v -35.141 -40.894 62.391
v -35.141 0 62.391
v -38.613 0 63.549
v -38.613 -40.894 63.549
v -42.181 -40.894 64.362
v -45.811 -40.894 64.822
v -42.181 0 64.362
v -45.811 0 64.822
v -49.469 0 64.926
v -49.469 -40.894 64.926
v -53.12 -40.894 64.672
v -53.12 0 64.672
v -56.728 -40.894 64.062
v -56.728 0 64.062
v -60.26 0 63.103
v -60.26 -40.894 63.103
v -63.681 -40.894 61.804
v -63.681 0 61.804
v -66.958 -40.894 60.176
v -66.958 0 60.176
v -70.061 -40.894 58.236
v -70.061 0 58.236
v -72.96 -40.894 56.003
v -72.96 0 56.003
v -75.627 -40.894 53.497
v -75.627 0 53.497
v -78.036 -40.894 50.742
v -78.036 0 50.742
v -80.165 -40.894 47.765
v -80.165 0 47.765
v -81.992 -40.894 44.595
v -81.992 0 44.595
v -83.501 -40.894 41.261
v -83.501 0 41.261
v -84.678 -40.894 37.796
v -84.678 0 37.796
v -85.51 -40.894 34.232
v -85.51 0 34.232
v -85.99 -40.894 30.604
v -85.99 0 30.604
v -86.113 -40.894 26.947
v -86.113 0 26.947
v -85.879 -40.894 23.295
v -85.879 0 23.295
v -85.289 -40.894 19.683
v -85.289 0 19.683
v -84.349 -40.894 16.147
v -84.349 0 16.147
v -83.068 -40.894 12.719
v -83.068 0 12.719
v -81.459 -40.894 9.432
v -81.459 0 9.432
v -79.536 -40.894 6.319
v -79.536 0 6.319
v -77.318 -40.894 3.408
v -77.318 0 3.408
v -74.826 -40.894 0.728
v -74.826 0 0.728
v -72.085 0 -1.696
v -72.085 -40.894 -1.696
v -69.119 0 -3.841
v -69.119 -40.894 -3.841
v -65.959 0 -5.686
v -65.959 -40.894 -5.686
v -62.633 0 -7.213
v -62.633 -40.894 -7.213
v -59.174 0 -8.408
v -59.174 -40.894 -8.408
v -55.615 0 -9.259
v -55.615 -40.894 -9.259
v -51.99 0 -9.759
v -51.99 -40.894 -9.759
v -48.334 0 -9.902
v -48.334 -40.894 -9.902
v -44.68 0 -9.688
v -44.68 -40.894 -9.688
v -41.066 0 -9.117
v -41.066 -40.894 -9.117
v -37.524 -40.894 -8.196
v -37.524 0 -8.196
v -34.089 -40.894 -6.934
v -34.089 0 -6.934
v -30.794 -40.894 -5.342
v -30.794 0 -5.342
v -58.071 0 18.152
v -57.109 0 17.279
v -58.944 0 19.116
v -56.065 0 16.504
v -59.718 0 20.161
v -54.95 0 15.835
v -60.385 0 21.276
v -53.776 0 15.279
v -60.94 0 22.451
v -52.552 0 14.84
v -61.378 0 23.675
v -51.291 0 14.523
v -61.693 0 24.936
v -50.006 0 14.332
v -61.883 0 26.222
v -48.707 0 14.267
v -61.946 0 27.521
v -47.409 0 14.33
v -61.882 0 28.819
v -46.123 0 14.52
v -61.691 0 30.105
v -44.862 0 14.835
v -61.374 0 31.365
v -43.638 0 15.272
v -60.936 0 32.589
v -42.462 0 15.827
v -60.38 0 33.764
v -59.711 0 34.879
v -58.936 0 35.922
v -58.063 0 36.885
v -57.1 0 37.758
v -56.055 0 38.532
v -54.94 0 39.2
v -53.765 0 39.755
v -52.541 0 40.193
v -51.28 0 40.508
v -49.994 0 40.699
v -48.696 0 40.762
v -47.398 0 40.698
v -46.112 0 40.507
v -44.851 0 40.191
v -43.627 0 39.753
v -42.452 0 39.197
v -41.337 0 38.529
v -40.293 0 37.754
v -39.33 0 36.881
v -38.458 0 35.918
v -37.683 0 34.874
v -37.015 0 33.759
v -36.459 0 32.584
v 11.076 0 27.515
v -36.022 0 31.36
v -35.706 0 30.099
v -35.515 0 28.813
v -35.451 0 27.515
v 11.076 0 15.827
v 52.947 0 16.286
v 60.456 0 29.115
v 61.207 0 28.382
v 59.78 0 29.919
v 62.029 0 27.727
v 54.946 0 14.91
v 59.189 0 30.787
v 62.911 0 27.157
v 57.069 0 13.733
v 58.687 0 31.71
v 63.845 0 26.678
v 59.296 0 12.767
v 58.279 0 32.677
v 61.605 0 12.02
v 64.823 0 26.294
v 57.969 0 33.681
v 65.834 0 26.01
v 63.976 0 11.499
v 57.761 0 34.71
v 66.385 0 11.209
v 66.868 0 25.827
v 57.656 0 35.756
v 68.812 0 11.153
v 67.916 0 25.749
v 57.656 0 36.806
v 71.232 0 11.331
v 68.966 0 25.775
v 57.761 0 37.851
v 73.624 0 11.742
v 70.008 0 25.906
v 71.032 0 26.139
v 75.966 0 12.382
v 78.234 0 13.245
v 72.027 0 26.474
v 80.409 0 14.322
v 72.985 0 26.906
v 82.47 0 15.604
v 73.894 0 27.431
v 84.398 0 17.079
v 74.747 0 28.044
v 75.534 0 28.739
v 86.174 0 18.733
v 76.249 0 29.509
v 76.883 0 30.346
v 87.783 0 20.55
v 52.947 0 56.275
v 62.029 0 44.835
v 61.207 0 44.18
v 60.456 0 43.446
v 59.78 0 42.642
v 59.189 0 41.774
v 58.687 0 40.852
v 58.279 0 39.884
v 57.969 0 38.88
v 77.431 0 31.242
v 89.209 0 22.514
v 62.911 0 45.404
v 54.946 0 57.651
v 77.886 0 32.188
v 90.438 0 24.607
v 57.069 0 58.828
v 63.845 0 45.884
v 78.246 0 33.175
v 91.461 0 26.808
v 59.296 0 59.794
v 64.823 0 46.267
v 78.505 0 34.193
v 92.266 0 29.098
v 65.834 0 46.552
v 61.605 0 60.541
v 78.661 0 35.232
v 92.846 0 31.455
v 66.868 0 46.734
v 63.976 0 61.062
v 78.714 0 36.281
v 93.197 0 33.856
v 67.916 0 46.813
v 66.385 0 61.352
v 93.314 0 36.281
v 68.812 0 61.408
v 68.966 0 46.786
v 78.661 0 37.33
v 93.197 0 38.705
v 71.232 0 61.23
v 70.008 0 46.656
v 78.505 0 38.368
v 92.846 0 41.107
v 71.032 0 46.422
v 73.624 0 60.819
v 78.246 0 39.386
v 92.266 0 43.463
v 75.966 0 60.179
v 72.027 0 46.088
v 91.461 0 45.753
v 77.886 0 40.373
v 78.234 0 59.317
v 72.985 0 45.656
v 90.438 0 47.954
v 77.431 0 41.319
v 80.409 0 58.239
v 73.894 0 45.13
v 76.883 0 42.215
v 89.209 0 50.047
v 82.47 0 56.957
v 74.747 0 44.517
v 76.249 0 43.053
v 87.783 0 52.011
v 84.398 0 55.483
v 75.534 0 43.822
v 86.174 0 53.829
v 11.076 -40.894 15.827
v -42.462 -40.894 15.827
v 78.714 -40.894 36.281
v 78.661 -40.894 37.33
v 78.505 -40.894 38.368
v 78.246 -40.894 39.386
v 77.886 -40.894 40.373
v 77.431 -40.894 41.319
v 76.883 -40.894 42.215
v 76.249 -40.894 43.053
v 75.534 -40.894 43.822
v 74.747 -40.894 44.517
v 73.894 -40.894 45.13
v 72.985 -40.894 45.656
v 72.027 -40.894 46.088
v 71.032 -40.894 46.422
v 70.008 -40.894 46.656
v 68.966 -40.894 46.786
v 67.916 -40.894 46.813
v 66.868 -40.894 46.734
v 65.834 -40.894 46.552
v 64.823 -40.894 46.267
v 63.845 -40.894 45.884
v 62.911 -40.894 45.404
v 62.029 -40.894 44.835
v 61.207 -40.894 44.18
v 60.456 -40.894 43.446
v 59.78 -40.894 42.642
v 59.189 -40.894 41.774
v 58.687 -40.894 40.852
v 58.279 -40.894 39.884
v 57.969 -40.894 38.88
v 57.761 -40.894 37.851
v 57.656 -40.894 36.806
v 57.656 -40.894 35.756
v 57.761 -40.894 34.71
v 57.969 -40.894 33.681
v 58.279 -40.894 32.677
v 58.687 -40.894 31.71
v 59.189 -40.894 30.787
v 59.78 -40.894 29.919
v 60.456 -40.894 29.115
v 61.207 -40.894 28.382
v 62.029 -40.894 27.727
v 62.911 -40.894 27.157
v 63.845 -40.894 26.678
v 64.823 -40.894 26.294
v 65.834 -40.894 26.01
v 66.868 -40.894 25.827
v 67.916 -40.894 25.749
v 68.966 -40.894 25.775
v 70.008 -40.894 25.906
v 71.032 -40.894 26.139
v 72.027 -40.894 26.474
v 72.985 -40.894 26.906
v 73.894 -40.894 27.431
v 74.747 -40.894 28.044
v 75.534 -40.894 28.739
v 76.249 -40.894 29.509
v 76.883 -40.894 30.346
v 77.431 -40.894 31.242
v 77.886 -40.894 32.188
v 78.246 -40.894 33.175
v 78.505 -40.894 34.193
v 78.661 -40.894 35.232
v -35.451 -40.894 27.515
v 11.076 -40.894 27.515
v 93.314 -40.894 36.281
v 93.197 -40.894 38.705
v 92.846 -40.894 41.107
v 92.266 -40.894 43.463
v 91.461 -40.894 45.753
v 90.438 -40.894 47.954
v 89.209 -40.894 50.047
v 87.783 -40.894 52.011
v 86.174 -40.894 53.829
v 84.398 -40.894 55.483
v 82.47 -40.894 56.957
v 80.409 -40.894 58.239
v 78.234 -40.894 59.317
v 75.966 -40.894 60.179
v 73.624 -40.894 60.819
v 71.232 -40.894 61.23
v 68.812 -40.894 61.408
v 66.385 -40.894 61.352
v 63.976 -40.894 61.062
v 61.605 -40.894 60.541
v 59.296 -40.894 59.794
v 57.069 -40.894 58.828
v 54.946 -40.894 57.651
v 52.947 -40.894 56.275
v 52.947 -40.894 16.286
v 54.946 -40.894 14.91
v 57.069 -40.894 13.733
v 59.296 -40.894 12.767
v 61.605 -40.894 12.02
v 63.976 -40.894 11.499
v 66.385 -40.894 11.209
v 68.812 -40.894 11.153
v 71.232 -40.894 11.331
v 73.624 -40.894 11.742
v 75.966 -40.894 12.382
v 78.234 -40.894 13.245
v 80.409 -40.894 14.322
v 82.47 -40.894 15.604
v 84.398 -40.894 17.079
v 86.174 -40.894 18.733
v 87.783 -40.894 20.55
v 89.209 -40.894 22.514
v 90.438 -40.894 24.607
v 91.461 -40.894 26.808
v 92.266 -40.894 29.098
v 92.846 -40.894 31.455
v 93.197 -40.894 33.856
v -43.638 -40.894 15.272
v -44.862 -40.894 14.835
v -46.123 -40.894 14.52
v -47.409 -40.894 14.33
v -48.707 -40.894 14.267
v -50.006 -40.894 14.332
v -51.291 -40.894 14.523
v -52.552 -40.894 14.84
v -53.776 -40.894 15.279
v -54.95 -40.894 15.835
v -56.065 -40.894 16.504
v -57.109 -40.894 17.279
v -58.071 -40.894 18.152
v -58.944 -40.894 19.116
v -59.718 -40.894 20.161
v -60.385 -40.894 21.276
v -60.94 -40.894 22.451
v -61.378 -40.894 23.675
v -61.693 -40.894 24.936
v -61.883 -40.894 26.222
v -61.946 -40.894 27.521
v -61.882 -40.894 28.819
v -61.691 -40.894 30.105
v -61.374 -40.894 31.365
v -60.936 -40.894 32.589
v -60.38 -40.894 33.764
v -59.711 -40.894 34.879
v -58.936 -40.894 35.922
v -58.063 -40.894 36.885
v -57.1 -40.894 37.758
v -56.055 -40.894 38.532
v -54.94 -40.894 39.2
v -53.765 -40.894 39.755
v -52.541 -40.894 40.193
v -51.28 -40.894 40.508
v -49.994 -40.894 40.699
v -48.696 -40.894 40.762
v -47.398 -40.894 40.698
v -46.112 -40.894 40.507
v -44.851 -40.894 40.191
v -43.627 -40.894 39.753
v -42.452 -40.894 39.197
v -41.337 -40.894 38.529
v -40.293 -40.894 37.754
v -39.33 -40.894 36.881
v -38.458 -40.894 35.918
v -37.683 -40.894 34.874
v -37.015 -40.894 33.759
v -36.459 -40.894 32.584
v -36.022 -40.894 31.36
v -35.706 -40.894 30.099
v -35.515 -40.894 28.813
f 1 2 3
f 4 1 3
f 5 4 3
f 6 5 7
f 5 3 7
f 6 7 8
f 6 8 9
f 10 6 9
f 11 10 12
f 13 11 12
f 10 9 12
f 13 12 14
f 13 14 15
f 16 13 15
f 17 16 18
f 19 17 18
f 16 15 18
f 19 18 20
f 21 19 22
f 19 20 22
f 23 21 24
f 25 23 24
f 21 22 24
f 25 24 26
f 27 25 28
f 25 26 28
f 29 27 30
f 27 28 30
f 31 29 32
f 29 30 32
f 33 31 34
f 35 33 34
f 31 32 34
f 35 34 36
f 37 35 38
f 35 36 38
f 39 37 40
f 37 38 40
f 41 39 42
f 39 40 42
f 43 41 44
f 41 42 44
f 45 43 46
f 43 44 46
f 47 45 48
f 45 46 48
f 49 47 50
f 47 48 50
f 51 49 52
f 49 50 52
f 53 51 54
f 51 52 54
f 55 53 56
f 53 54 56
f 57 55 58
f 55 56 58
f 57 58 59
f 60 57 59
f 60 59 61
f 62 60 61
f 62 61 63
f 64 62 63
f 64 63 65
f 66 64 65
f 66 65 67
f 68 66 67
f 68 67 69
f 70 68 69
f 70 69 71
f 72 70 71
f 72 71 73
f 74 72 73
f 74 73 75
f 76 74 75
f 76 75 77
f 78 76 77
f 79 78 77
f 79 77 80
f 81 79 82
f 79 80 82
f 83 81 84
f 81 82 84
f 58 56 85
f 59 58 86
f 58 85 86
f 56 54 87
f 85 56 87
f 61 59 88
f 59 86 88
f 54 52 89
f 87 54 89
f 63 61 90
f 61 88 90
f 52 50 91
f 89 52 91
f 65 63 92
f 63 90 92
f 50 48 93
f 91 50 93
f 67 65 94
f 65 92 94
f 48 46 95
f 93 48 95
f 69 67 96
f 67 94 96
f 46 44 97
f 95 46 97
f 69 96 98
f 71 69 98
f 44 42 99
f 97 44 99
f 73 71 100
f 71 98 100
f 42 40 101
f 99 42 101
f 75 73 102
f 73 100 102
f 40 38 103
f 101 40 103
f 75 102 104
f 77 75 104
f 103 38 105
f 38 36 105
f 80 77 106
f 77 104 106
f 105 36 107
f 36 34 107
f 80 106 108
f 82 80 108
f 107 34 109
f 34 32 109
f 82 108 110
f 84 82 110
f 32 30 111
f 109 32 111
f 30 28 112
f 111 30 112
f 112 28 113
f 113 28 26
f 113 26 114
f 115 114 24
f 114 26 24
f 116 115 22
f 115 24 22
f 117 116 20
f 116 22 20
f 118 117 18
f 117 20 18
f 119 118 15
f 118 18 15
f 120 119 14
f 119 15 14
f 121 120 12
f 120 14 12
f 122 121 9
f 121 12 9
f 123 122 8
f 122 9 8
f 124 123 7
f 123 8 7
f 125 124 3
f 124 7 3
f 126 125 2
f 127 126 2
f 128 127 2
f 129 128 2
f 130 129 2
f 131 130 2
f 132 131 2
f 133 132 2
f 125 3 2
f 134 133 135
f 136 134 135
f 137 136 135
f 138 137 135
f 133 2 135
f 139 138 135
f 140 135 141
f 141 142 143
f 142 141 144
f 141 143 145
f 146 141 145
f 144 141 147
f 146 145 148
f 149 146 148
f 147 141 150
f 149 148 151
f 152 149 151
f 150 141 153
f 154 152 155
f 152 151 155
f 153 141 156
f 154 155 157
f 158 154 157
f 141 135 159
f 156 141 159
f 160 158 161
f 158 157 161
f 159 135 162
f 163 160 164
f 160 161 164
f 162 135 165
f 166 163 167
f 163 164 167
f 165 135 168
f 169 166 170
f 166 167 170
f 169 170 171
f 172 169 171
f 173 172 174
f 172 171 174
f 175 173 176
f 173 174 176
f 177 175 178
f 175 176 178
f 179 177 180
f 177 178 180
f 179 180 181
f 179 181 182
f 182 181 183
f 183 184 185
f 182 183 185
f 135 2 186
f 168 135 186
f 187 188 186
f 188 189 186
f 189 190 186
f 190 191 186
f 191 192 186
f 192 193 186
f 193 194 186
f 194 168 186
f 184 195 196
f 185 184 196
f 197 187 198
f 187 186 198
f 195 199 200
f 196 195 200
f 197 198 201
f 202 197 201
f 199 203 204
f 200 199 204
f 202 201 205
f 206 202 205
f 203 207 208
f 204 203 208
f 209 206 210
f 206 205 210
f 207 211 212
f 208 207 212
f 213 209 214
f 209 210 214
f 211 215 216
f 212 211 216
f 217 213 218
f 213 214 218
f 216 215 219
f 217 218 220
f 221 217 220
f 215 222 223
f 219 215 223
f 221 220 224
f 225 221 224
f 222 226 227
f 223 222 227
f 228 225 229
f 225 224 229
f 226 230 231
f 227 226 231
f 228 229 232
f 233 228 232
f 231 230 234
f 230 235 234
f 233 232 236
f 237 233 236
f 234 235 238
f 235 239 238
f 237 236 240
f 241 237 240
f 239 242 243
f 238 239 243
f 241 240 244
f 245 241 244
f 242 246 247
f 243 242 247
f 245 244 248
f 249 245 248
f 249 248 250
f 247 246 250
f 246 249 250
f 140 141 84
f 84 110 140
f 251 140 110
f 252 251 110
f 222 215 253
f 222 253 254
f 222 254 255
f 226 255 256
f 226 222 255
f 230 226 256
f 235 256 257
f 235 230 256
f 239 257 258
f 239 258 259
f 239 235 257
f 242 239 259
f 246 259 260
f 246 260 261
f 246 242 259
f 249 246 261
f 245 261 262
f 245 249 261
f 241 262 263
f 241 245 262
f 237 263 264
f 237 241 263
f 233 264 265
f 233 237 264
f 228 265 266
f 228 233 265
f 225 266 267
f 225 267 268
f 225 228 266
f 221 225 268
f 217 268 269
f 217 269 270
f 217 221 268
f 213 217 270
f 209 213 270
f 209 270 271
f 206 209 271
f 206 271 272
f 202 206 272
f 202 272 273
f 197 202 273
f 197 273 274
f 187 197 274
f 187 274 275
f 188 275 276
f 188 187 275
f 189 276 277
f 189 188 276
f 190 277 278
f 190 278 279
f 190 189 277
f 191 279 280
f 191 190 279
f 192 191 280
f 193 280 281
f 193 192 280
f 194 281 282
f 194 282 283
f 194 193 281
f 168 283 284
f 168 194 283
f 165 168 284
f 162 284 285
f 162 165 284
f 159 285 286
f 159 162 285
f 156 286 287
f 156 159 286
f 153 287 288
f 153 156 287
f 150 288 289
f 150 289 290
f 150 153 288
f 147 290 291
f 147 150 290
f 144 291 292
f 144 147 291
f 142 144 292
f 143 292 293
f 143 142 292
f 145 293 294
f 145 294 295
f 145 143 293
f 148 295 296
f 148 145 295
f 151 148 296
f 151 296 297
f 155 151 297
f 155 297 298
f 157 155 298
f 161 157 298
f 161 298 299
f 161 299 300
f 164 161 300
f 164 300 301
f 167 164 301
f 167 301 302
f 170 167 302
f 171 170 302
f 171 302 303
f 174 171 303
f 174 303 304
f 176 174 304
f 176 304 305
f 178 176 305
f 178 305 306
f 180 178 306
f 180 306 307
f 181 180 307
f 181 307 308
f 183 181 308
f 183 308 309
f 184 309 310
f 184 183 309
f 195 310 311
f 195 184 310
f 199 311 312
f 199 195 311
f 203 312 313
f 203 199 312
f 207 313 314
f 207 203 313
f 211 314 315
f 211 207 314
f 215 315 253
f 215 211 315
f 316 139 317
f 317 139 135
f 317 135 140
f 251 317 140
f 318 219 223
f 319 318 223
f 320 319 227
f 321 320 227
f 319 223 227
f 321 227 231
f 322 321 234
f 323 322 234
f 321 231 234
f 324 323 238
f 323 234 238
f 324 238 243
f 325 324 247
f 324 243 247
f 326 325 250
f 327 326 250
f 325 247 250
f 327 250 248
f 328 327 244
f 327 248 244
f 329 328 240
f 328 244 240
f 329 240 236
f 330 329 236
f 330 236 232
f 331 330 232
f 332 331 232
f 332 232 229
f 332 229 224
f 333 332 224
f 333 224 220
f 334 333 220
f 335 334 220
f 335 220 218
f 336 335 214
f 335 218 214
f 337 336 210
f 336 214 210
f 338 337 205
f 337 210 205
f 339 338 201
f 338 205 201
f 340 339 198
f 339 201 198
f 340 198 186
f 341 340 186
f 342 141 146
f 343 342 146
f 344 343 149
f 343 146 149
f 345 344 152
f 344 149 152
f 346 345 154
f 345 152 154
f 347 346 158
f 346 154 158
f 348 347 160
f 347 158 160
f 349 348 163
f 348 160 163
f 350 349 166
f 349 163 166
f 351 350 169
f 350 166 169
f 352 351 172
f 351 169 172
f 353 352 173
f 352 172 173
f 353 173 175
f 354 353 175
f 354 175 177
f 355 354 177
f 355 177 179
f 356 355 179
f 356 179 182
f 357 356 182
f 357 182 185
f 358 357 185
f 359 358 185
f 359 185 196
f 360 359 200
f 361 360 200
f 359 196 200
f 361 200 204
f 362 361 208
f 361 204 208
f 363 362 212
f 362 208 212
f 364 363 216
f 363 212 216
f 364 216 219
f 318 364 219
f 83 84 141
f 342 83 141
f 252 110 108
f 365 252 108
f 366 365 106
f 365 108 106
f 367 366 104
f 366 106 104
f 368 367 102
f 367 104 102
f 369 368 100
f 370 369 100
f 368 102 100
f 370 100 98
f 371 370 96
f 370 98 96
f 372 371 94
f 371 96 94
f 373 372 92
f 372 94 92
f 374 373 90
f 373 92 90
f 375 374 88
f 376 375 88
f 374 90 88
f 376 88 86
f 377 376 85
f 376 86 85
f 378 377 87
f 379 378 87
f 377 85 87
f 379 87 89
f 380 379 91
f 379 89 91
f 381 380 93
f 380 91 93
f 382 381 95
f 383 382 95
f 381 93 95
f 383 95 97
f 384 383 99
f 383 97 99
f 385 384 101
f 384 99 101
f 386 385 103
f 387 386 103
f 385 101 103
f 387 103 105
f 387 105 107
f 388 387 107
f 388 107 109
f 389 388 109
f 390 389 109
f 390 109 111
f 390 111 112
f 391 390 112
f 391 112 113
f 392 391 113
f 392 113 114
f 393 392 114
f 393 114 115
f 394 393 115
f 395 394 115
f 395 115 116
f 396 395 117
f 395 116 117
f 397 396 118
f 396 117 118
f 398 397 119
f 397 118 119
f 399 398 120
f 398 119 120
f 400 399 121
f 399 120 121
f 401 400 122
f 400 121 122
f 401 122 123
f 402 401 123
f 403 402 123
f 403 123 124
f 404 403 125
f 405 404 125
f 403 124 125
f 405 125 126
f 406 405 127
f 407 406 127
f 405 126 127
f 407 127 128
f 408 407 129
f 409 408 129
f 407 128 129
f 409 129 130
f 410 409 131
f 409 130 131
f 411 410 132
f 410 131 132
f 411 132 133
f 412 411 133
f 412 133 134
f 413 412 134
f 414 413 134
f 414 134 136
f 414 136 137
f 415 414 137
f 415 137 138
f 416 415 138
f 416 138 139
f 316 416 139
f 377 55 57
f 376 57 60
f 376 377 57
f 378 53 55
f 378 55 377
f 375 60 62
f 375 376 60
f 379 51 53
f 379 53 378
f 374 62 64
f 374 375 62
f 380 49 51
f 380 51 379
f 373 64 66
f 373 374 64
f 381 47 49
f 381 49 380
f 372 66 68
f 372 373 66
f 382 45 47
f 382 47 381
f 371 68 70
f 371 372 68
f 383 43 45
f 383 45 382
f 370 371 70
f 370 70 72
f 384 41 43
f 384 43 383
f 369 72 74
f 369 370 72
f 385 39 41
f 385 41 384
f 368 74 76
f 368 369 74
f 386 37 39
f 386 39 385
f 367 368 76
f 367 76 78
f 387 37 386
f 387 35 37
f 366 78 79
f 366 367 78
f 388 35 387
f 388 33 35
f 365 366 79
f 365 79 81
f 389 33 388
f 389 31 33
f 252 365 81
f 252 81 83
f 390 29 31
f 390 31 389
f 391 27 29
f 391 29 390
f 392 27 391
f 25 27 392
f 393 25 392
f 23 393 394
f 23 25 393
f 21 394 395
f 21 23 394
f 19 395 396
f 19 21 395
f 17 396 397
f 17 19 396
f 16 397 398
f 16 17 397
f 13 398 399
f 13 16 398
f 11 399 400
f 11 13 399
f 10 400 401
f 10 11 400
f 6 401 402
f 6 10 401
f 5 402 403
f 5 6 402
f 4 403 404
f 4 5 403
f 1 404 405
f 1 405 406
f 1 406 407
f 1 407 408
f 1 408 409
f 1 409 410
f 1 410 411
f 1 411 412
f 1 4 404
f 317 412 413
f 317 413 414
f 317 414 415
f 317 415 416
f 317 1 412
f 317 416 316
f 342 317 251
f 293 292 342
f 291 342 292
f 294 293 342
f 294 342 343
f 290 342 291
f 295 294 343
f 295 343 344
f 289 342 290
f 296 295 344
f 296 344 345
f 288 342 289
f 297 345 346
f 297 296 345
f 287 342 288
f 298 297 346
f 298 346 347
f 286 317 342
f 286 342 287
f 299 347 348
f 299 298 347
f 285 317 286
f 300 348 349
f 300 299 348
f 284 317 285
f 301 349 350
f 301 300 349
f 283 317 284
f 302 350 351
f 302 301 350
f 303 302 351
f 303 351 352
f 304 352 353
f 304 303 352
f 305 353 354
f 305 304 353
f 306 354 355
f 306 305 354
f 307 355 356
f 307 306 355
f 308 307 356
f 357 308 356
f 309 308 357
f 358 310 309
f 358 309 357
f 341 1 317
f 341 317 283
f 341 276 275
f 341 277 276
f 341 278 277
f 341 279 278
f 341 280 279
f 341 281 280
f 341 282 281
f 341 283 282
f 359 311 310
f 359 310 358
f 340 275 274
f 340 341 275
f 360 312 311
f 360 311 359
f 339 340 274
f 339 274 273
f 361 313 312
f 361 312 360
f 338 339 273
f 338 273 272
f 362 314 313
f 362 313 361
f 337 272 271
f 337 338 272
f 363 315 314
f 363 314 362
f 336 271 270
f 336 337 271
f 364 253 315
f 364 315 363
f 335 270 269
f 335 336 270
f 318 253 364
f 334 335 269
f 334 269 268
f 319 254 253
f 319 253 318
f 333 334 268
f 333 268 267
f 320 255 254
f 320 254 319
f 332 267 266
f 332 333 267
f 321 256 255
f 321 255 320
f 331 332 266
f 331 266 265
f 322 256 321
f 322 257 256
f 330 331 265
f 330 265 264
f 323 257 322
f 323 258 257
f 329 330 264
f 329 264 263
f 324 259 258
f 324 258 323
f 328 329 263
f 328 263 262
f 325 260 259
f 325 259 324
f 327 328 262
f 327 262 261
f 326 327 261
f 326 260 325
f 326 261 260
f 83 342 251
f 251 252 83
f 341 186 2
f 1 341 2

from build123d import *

# Parameters (mm, degrees)
F0_R     = 10.535173
F1_DEPTH = 40.894


with BuildPart() as f1:
    # F0 (on Front) → F1 (new body)
    with BuildSketch(Plane.XZ):
        with BuildLine():
            Line((-35.451322, 27.514845), (-11.27987, 27.514845))
            ThreePointArc((-11.27987, 27.514845), (-17.816037, 48.643776), (-35.141124, 62.391305))
            ThreePointArc((-35.141124, 62.391305), (-86.04097, 25.118193), (-30.793919, -5.342315))
            ThreePointArc((-30.793919, -5.342315), (-19.953258, 3.559245), (-13.152019, 15.827123))
            Line((-13.152019, 15.827123), (-42.462349, 15.827123))
            ThreePointArc((-42.462349, 15.827123), (-60.059173, 34.329486), (-35.451322, 27.514845))
        make_face()
        with BuildLine():
            ThreePointArc((-35.141124, 62.391305), (-17.816037, 48.643776), (-11.27987, 27.514845))
            Line((-11.27987, 27.514845), (11.076483, 27.514845))
            Line((11.076483, 27.514845), (11.076483, 15.827123))
            Line((11.076483, 15.827123), (-13.152019, 15.827123))
            ThreePointArc((-13.152019, 15.827123), (-19.953258, 3.559245), (-30.793919, -5.342315))
            Line((-30.793919, -5.342315), (52.946884, 16.285895))
            ThreePointArc((52.946884, 16.285895), (43.042984, 36.280636), (52.946884, 56.275376))
            Line((52.946884, 56.275376), (-35.141124, 62.391305))
        make_face()
        with BuildLine():
            ThreePointArc((93.313772, 36.280636), (79.334956, 58.804375), (52.946884, 56.275376))
            ThreePointArc((52.946884, 56.275376), (43.042984, 36.280636), (52.946884, 16.285895))
            ThreePointArc((52.946884, 16.285895), (79.334956, 13.756897), (93.313772, 36.280636))
        make_face()
        with Locations((68.178378, 36.280636)):
            Circle(F0_R, mode=Mode.SUBTRACT)
    extrude(amount=F1_DEPTH)


solid = f1.part
